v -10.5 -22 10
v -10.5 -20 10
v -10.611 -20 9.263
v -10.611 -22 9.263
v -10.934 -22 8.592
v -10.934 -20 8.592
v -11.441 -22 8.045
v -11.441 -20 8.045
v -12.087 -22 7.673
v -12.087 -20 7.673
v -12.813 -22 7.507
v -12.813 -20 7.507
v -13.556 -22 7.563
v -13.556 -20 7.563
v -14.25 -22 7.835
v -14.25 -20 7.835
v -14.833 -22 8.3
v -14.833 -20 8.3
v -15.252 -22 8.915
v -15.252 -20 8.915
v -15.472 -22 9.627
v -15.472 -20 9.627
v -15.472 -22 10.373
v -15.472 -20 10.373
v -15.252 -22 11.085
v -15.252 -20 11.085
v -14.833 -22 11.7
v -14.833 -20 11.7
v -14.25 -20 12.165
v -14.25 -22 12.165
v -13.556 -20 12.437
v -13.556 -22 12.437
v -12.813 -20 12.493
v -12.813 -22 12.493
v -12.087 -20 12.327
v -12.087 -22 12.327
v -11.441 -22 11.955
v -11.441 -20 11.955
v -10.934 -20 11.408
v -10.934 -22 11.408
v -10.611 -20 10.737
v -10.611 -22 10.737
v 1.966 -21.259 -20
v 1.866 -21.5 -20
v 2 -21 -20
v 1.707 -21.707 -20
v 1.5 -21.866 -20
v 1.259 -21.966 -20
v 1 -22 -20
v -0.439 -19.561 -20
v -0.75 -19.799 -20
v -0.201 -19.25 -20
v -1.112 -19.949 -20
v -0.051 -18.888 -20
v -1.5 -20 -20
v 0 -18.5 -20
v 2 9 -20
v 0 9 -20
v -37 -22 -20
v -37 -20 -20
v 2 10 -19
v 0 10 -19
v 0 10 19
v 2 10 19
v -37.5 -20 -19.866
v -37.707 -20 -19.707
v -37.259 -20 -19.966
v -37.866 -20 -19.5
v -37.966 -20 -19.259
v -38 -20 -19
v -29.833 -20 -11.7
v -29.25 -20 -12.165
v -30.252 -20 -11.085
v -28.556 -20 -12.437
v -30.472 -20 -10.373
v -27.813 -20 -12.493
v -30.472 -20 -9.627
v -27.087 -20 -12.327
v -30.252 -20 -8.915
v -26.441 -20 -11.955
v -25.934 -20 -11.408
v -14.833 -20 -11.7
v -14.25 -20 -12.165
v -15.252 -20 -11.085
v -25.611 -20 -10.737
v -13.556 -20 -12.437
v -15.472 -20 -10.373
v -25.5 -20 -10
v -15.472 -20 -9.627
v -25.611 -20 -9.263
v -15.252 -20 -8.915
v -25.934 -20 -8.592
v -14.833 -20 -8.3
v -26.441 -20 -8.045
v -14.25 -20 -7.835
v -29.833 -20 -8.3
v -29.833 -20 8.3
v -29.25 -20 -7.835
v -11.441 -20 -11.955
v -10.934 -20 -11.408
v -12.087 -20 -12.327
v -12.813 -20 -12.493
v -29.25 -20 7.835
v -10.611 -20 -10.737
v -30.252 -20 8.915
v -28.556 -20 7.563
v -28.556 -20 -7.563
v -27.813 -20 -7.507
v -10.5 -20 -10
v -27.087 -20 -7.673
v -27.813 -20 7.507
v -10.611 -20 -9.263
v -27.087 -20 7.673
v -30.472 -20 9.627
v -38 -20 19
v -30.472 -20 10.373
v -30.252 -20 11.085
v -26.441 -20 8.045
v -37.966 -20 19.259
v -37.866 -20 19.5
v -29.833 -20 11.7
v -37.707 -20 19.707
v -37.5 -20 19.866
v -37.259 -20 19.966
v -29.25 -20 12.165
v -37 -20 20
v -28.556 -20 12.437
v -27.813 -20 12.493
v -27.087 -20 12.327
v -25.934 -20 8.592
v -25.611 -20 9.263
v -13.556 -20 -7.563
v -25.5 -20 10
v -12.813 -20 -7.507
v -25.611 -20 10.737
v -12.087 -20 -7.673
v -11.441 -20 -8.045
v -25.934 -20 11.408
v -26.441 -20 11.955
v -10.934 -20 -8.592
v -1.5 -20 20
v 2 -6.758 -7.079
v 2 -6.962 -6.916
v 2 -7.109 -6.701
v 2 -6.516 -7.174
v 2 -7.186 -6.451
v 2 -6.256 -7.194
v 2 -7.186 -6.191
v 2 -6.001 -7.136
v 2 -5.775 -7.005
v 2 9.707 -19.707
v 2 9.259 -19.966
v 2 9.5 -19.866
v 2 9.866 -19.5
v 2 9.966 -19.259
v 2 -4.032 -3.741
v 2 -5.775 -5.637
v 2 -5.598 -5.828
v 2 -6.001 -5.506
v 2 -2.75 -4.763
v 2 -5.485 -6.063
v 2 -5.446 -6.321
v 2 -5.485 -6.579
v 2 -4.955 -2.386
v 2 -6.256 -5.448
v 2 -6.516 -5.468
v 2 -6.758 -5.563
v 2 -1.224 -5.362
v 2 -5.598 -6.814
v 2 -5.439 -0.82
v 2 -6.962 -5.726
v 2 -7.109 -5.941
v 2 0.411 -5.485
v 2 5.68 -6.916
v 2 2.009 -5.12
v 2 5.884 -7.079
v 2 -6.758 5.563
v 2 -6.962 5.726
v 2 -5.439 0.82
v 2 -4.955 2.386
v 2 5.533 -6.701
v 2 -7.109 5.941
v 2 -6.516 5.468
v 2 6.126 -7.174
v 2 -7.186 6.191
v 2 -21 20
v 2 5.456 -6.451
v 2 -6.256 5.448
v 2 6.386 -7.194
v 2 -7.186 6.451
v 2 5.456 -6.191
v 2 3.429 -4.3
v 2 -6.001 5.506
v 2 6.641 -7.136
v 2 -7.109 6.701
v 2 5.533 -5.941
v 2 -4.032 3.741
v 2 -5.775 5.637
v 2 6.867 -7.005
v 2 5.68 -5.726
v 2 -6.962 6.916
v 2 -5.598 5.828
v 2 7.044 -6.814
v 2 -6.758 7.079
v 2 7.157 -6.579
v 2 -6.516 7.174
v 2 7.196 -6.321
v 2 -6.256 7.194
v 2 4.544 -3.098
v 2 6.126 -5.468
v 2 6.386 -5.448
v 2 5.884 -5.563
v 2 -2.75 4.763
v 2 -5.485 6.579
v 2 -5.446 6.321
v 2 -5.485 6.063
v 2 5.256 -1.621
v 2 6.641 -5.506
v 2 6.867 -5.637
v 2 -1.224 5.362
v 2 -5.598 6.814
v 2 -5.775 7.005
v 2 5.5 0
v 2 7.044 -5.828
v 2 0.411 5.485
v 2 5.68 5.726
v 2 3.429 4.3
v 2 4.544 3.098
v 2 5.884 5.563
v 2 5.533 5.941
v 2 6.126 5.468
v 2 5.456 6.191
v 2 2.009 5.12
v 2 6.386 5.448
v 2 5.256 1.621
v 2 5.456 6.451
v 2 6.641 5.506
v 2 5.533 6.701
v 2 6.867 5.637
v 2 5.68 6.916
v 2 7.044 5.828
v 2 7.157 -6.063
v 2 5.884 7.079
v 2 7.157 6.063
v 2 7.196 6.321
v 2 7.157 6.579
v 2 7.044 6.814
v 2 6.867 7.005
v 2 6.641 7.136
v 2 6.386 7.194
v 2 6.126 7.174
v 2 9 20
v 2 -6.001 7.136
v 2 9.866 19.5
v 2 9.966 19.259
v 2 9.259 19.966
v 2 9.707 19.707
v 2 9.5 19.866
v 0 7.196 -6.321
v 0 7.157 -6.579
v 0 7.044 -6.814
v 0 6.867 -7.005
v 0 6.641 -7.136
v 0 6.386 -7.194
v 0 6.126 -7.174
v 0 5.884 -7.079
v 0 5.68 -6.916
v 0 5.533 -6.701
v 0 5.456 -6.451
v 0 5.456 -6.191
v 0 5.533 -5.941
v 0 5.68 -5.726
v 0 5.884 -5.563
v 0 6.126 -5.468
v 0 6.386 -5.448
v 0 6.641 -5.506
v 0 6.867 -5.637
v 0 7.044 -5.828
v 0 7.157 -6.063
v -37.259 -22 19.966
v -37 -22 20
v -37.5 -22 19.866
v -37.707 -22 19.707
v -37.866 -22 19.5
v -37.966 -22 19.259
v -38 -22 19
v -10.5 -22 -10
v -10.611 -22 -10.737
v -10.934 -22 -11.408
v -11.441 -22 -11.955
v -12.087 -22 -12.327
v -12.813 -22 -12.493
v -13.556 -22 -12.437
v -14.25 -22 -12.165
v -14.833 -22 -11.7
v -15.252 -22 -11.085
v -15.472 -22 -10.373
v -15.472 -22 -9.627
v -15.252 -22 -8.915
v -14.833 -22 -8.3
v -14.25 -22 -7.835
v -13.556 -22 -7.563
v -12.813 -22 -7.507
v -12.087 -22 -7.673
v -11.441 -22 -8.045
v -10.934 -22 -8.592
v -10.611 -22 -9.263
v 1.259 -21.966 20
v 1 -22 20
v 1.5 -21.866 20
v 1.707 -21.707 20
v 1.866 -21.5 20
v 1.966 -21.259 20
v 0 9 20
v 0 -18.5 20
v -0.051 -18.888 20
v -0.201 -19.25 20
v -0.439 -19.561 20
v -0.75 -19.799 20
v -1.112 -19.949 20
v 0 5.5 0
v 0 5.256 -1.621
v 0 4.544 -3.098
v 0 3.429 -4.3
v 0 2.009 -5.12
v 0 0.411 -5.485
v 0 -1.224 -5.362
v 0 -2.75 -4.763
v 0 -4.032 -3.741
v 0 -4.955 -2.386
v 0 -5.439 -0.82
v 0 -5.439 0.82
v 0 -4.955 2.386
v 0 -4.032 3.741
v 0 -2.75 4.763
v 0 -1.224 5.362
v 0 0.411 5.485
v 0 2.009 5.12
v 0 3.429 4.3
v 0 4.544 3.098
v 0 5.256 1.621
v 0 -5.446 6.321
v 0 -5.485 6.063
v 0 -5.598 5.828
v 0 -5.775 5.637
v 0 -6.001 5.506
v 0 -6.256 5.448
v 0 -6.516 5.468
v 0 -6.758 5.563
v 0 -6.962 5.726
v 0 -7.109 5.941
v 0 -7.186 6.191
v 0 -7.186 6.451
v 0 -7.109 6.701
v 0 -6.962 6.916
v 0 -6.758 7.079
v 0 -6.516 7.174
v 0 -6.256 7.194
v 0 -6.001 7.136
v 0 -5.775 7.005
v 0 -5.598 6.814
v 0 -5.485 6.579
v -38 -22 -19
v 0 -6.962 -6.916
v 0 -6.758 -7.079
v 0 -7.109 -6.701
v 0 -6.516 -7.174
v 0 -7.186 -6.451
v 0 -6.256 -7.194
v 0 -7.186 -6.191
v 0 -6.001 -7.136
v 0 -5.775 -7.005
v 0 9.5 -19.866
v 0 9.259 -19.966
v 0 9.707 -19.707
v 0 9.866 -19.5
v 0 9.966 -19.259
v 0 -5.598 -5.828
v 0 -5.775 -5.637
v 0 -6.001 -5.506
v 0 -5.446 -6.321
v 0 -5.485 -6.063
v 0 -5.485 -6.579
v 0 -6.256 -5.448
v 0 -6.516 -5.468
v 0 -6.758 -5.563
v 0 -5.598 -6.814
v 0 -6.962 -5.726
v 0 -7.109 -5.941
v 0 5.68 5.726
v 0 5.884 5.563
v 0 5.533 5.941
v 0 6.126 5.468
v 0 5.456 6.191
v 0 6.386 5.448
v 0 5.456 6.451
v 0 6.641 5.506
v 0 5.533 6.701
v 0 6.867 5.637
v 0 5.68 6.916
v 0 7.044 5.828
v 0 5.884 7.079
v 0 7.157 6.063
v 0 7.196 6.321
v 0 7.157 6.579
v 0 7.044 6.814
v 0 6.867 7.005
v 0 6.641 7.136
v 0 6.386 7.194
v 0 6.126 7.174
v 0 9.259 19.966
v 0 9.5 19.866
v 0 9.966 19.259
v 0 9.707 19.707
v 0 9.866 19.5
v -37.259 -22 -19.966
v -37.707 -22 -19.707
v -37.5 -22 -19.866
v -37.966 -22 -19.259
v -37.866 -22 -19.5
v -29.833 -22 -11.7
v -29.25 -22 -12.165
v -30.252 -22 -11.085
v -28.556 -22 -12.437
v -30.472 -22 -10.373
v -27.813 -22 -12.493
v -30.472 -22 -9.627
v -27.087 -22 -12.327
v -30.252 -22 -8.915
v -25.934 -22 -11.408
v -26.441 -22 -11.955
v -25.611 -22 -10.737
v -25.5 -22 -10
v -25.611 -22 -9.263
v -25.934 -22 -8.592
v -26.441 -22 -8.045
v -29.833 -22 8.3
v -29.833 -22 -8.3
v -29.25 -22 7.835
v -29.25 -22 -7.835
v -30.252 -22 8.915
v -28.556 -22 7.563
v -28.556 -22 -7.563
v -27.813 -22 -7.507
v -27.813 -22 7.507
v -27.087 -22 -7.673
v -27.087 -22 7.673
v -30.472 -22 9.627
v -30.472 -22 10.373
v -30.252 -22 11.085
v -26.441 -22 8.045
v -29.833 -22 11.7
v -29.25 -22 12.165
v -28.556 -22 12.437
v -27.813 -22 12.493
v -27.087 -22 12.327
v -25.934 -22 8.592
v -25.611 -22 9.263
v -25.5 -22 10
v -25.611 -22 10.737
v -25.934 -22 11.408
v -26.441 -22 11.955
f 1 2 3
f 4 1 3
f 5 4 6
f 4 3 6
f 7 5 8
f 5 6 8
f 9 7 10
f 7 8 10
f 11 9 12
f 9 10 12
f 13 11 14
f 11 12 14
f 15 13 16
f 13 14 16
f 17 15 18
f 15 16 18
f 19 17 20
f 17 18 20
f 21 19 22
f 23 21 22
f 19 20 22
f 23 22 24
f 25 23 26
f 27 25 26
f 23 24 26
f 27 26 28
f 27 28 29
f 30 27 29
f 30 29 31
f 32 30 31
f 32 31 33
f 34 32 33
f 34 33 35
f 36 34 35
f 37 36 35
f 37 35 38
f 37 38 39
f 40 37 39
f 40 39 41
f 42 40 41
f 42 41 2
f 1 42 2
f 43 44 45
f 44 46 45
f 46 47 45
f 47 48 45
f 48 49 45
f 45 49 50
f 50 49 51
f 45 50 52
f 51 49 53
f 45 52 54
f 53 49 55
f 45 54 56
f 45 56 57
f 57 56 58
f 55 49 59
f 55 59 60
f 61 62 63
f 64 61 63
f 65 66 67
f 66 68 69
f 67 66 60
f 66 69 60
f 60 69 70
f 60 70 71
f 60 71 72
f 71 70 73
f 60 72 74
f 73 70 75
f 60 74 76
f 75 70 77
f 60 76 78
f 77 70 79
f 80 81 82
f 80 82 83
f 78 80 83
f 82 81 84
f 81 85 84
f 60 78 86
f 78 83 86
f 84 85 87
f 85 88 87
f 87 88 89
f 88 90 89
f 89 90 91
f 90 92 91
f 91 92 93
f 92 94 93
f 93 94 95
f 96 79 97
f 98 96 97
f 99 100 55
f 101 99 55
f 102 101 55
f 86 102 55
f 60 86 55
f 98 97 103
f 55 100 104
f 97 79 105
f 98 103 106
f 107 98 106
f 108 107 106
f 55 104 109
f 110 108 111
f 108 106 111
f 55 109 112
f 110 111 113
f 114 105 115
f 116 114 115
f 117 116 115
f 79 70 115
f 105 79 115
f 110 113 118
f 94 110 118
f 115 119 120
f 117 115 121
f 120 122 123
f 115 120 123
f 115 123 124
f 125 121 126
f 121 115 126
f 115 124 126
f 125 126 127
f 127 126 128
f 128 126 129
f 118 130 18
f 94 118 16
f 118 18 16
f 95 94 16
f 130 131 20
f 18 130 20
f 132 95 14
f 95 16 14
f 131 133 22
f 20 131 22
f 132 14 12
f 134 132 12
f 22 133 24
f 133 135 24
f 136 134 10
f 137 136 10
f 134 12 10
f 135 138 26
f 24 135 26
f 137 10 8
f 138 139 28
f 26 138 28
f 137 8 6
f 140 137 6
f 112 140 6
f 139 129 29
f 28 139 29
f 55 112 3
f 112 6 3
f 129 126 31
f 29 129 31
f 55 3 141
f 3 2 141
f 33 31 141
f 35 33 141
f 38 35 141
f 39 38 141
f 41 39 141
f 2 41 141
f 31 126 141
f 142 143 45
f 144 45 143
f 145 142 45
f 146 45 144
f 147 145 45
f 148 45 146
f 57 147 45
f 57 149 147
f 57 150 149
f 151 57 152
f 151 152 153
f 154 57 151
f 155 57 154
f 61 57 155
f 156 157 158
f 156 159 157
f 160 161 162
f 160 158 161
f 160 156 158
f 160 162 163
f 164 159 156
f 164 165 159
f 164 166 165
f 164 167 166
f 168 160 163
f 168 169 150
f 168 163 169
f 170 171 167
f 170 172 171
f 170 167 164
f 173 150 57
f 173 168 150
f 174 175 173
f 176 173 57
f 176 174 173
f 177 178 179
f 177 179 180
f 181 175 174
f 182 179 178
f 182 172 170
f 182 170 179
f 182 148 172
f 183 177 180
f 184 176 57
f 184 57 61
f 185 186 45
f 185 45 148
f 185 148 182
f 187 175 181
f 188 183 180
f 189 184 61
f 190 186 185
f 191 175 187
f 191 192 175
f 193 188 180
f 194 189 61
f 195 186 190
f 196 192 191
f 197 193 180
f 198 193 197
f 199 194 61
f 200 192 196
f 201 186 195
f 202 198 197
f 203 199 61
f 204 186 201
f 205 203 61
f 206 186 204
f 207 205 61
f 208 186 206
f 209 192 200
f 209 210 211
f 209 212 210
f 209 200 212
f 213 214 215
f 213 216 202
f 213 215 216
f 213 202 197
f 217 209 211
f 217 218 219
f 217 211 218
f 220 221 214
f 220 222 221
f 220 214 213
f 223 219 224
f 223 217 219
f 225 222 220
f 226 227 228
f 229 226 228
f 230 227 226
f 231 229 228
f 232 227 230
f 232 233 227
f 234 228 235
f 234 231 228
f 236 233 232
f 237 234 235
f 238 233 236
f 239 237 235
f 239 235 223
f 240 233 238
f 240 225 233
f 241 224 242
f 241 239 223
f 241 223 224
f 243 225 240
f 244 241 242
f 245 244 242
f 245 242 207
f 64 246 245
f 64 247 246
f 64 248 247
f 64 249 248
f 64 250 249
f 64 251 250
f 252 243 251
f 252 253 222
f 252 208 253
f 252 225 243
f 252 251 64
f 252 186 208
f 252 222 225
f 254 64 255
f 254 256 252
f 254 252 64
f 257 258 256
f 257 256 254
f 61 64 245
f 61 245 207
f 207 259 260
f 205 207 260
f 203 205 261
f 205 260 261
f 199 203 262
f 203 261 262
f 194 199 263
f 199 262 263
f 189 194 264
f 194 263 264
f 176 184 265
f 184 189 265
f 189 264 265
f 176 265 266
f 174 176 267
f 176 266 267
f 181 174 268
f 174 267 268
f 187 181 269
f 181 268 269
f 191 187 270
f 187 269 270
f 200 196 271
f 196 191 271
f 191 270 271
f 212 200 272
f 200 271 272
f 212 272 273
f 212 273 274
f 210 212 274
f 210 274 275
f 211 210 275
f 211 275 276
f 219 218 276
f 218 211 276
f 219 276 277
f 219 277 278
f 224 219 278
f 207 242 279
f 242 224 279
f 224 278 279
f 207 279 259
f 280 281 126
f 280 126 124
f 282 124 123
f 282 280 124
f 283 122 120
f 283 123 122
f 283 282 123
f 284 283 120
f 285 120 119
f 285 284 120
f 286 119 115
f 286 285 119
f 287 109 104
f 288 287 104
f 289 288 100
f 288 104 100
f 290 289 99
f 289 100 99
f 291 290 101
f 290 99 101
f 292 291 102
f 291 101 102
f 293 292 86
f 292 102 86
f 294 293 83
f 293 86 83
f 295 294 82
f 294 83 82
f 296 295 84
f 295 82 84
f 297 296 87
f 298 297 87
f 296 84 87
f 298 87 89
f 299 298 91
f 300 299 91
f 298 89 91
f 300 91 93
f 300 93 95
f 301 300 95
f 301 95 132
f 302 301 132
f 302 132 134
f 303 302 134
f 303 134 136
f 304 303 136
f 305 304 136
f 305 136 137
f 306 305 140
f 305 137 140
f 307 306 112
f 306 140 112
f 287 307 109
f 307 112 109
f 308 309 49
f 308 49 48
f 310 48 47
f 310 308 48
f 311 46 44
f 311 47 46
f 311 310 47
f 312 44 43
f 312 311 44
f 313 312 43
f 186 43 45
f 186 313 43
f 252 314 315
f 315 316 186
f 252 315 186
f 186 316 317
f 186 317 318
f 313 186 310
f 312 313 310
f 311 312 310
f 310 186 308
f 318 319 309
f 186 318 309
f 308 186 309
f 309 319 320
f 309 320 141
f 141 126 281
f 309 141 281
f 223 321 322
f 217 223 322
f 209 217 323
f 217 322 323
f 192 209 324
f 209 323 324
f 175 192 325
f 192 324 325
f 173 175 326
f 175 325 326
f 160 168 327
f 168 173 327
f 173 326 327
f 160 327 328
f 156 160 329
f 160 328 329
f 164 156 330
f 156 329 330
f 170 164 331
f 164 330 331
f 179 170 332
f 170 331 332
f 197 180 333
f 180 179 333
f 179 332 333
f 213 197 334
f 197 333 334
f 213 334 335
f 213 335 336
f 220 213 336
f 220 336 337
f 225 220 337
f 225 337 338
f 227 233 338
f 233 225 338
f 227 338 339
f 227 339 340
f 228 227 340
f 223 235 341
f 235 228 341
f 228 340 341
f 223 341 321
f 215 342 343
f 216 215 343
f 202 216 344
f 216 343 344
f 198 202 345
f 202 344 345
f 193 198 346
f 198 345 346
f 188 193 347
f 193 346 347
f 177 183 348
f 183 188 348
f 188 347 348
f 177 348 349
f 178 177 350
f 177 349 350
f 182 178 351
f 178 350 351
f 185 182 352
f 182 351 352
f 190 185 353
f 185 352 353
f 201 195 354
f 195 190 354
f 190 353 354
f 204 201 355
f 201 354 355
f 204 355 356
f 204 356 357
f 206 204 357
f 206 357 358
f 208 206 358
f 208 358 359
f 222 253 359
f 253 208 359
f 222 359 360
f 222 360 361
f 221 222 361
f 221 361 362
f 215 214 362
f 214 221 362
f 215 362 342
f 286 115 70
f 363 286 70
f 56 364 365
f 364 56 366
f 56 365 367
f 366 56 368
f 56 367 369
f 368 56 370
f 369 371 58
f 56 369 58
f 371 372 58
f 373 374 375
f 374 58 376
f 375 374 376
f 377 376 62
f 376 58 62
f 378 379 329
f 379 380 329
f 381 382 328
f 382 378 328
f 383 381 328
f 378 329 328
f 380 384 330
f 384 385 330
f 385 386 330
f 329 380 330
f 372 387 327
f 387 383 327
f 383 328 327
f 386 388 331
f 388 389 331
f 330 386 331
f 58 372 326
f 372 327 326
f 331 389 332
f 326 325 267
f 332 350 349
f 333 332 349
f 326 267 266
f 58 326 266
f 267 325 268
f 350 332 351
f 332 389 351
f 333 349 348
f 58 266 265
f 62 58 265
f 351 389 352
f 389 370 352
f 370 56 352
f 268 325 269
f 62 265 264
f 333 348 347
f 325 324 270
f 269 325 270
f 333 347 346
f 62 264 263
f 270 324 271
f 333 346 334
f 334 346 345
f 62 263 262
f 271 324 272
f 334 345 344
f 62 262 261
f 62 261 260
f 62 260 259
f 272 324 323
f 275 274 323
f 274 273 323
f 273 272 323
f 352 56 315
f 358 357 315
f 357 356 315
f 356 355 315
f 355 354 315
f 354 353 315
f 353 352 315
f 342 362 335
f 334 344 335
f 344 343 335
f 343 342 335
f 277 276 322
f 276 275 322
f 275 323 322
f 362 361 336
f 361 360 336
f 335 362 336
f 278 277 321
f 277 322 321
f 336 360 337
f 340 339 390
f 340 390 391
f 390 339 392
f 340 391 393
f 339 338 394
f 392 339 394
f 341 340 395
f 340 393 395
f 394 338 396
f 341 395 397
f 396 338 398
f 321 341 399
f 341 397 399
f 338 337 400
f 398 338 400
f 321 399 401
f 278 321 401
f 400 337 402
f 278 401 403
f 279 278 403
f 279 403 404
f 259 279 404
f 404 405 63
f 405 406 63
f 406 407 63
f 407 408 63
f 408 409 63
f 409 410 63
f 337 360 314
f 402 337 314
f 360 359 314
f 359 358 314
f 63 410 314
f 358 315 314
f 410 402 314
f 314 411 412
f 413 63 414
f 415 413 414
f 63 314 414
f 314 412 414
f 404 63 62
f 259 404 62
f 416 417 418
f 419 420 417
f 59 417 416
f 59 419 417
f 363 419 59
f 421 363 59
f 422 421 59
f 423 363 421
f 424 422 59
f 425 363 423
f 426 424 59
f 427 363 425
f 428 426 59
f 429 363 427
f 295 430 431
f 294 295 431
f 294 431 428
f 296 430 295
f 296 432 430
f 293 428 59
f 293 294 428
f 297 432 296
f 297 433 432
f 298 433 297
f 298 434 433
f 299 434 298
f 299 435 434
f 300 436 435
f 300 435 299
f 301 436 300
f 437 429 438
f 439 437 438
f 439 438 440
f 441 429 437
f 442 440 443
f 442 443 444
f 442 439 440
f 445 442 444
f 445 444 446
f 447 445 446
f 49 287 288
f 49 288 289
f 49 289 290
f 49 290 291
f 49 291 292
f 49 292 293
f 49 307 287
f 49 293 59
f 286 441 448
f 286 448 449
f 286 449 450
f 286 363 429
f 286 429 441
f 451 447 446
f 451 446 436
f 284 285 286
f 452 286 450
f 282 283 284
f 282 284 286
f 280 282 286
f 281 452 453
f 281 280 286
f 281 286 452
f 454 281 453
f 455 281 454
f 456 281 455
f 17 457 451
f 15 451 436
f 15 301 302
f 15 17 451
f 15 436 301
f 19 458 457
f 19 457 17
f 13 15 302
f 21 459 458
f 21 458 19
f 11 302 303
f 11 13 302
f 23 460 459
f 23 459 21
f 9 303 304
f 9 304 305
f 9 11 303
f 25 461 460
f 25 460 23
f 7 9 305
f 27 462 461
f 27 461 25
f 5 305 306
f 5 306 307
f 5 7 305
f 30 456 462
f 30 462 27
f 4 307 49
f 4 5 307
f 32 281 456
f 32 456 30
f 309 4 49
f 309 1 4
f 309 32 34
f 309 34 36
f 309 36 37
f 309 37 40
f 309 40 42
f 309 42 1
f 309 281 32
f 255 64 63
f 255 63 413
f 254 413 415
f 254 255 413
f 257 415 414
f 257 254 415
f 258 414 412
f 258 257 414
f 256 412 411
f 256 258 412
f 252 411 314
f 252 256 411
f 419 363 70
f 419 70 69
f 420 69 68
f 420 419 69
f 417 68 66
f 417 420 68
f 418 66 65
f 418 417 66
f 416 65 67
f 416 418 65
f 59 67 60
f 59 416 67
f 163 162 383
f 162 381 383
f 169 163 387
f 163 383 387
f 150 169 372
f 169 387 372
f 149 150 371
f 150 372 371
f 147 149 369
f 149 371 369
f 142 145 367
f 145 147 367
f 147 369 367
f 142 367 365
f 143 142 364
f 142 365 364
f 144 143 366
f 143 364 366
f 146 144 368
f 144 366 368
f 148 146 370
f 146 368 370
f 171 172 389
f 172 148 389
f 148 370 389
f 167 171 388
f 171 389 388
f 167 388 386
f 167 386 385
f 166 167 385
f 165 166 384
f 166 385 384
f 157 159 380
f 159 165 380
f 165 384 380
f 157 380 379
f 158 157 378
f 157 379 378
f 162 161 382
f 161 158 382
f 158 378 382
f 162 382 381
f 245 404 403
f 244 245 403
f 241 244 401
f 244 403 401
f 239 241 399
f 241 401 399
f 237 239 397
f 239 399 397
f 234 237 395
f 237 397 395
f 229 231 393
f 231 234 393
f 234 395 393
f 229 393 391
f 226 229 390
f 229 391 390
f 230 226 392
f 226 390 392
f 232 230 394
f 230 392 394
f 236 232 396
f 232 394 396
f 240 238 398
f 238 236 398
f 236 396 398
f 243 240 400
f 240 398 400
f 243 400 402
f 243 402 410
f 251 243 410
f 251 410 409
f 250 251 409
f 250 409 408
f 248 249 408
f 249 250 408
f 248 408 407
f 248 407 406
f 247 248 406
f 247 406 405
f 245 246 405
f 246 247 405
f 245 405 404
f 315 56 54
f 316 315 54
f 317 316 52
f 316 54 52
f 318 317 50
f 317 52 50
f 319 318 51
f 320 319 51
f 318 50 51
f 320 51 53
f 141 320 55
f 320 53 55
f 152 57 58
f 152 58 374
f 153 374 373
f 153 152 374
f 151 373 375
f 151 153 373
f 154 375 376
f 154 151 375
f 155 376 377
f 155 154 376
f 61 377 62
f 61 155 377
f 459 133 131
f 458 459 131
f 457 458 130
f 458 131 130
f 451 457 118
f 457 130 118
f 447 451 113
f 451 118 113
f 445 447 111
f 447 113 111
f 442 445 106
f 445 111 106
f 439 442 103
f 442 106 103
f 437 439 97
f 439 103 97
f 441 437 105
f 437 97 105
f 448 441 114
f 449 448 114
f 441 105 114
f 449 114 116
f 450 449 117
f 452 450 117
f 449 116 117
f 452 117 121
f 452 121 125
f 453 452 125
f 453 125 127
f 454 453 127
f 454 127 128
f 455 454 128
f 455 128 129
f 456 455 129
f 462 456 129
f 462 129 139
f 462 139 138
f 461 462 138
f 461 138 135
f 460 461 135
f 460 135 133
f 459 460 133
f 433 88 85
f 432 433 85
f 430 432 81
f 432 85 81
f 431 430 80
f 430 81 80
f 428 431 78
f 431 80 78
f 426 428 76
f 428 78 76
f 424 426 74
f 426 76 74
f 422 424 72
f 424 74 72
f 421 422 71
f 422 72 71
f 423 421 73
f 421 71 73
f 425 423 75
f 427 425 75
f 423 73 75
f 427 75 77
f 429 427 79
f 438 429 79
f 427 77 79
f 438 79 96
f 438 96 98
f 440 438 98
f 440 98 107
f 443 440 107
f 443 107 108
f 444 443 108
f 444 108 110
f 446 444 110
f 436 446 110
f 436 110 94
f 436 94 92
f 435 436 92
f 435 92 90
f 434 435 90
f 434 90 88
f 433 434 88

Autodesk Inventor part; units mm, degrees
ref_plane "YZ Plane" through (0, 0, 0) normal (1, 0, 0) x (0, 1, 0)
ref_plane "XZ Plane" through (0, 0, 0) normal (0, 1, 0) x (-1, 0, 0)
ref_plane "XY Plane" through (0, 0, 0) normal (0, 0, 1) x (1, 0, 0)
sketch "Boceto1" plane through (0, 0, 0) normal (1, 0, 0) x (0, 1, 0)
  line L0 (-6.321, 6.321) -> (6.321, 6.321) construction
  line L1 (6.321, 6.321) -> (6.321, -6.321) construction
  line L2 (6.321, -6.321) -> (-6.321, -6.321) construction
  line L3 (-6.321, -6.321) -> (-6.321, 6.321) construction
  line L4 (-6.321, 6.321) -> (6.321, -6.321) construction
  line L5 (6.321, 6.321) -> (-6.321, -6.321) construction
  circle A0 centre (6.321, -6.321) radius 0.875
  line L6 (0, 0) -> (7.9878, 0) construction
  circle A1 centre (6.321, 6.321) radius 0.875
  line L7 (0, 0) -> (0, -13.4562) construction
  circle A2 centre (-6.321, -6.321) radius 0.875
  circle A3 centre (-6.321, 6.321) radius 0.875
  circle A4 centre (0, 0) radius 5.5
  line L8 (10, 20) -> (-20, 20)
  line L9 (-20, 20) -> (-20, -20)
  line L10 (-20, -20) -> (10, -20)
  line L11 (10, -20) -> (10, 20)
  dimension "d0" = 12.642
  dimension "d1" = 12.642
  dimension "d2" = 1.75
  dimension "d3" = 11
  dimension "d4" = 30
  dimension "d6" = 20
  dimension "d7" = 10
  dimension "d26" = 20
extrude "Extrusión1" add sketch "Boceto1" along normal blind 2
sketch "Boceto2" plane through (0, -20, -20) normal (0, -1, 0) x (1, 0, 0)
  line L0 (2, 0) -> (2, 40) projected
  line L1 (2, 40) -> (-38, 40)
  line L2 (-38, 40) -> (-38, 0)
  line L3 (-38, 0) -> (2, 0)
  line L4 (2, 0) -> (2, 40)
  point P0 (0, 20)
  point P1 (2, 0)
  dimension "d10" = 40
  dimension "d11" = 40
extrude "Extrusión2" add sketch "Boceto2" along normal blind 2
fillet "Empalme1" radius 1.5 1 edges at (0, -20, 0)
fillet "Empalme2" radius 1 5 edges at (1, 10, 20) (1, 10, -20) (-38, -21, 20) (-38, -21, -20) (2, -22, 0)
sketch "Boceto4" plane through (0, -20, -20) normal (0, 1, 0) x (1, 0, 0)
  circle A0 centre (-13, -10) radius 2.5
  circle A1 centre (-13, -30) radius 2.5
  circle A2 centre (-28, -10) radius 2.5
  circle A3 centre (-28, -30) radius 2.5
  line L0 (-1.5, -40) -> (-37, -40) projected
  line L1 (-38, -39) -> (-38, -1) projected
  point P0 (0, -20)
  dimension "d27" = 5
  dimension "d28" = 5
  dimension "d29" = 5
  dimension "d30" = 5
  dimension "d31" = 10
  dimension "d32" = 20
  dimension "d33" = 20
  dimension "d34" = 15
  dimension "d35" = 10
extrude "Extrusión4" cut sketch "Boceto4" against normal through all
sketch "Boceto3" plane through (0, -20, -20) normal (0, 1, 0) x (1, 0, 0)
  line L0 (0, -40) -> (0, 0) projected
  line L1 (-28, 0) -> (0, 0) projected
  line L2 (-28, -40) -> (-28, 0) projected
  line L3 (0, -40) -> (-28, -40) projected
  line L4 (-6.125, -3.125) -> (-6.125, -36.875) construction
  line L5 (-7.25, -3.125) -> (-7.25, -36.875)
  line L6 (-5, -36.875) -> (-5, -3.125)
  arc A0 (-5, -3.125) -> (-7.25, -3.125) centre (-6.125, -3.125) ccw
  arc A1 (-7.25, -36.875) -> (-5, -36.875) centre (-6.125, -36.875) ccw
  line L7 (-21.875, -3.125) -> (-21.875, -36.875) construction
  line L8 (-23, -3.125) -> (-23, -36.875)
  line L9 (-20.75, -36.875) -> (-20.75, -3.125)
  arc A2 (-20.75, -3.125) -> (-23, -3.125) centre (-21.875, -3.125) ccw
  arc A3 (-23, -36.875) -> (-20.75, -36.875) centre (-21.875, -36.875) ccw
  point P0 (0, -20)
  point P1 (-6.125, -20)
  point P2 (-21.875, -20)
  point P3 (-21.875, -38)
  point P4 (-21.875, -2)
  point P5 (-6.125, -38)
  point P6 (-6.125, -2)
  dimension "d14" = 2.25
  dimension "d15" = 2.25
  dimension "d16" = 5
  dimension "d17" = 2
  dimension "d18" = 2
  dimension "d19" = 2
  dimension "d20" = 2
  dimension "d21" = 5
properties part number "BRACKET_MOTOR" material "Aluminio 6061"
